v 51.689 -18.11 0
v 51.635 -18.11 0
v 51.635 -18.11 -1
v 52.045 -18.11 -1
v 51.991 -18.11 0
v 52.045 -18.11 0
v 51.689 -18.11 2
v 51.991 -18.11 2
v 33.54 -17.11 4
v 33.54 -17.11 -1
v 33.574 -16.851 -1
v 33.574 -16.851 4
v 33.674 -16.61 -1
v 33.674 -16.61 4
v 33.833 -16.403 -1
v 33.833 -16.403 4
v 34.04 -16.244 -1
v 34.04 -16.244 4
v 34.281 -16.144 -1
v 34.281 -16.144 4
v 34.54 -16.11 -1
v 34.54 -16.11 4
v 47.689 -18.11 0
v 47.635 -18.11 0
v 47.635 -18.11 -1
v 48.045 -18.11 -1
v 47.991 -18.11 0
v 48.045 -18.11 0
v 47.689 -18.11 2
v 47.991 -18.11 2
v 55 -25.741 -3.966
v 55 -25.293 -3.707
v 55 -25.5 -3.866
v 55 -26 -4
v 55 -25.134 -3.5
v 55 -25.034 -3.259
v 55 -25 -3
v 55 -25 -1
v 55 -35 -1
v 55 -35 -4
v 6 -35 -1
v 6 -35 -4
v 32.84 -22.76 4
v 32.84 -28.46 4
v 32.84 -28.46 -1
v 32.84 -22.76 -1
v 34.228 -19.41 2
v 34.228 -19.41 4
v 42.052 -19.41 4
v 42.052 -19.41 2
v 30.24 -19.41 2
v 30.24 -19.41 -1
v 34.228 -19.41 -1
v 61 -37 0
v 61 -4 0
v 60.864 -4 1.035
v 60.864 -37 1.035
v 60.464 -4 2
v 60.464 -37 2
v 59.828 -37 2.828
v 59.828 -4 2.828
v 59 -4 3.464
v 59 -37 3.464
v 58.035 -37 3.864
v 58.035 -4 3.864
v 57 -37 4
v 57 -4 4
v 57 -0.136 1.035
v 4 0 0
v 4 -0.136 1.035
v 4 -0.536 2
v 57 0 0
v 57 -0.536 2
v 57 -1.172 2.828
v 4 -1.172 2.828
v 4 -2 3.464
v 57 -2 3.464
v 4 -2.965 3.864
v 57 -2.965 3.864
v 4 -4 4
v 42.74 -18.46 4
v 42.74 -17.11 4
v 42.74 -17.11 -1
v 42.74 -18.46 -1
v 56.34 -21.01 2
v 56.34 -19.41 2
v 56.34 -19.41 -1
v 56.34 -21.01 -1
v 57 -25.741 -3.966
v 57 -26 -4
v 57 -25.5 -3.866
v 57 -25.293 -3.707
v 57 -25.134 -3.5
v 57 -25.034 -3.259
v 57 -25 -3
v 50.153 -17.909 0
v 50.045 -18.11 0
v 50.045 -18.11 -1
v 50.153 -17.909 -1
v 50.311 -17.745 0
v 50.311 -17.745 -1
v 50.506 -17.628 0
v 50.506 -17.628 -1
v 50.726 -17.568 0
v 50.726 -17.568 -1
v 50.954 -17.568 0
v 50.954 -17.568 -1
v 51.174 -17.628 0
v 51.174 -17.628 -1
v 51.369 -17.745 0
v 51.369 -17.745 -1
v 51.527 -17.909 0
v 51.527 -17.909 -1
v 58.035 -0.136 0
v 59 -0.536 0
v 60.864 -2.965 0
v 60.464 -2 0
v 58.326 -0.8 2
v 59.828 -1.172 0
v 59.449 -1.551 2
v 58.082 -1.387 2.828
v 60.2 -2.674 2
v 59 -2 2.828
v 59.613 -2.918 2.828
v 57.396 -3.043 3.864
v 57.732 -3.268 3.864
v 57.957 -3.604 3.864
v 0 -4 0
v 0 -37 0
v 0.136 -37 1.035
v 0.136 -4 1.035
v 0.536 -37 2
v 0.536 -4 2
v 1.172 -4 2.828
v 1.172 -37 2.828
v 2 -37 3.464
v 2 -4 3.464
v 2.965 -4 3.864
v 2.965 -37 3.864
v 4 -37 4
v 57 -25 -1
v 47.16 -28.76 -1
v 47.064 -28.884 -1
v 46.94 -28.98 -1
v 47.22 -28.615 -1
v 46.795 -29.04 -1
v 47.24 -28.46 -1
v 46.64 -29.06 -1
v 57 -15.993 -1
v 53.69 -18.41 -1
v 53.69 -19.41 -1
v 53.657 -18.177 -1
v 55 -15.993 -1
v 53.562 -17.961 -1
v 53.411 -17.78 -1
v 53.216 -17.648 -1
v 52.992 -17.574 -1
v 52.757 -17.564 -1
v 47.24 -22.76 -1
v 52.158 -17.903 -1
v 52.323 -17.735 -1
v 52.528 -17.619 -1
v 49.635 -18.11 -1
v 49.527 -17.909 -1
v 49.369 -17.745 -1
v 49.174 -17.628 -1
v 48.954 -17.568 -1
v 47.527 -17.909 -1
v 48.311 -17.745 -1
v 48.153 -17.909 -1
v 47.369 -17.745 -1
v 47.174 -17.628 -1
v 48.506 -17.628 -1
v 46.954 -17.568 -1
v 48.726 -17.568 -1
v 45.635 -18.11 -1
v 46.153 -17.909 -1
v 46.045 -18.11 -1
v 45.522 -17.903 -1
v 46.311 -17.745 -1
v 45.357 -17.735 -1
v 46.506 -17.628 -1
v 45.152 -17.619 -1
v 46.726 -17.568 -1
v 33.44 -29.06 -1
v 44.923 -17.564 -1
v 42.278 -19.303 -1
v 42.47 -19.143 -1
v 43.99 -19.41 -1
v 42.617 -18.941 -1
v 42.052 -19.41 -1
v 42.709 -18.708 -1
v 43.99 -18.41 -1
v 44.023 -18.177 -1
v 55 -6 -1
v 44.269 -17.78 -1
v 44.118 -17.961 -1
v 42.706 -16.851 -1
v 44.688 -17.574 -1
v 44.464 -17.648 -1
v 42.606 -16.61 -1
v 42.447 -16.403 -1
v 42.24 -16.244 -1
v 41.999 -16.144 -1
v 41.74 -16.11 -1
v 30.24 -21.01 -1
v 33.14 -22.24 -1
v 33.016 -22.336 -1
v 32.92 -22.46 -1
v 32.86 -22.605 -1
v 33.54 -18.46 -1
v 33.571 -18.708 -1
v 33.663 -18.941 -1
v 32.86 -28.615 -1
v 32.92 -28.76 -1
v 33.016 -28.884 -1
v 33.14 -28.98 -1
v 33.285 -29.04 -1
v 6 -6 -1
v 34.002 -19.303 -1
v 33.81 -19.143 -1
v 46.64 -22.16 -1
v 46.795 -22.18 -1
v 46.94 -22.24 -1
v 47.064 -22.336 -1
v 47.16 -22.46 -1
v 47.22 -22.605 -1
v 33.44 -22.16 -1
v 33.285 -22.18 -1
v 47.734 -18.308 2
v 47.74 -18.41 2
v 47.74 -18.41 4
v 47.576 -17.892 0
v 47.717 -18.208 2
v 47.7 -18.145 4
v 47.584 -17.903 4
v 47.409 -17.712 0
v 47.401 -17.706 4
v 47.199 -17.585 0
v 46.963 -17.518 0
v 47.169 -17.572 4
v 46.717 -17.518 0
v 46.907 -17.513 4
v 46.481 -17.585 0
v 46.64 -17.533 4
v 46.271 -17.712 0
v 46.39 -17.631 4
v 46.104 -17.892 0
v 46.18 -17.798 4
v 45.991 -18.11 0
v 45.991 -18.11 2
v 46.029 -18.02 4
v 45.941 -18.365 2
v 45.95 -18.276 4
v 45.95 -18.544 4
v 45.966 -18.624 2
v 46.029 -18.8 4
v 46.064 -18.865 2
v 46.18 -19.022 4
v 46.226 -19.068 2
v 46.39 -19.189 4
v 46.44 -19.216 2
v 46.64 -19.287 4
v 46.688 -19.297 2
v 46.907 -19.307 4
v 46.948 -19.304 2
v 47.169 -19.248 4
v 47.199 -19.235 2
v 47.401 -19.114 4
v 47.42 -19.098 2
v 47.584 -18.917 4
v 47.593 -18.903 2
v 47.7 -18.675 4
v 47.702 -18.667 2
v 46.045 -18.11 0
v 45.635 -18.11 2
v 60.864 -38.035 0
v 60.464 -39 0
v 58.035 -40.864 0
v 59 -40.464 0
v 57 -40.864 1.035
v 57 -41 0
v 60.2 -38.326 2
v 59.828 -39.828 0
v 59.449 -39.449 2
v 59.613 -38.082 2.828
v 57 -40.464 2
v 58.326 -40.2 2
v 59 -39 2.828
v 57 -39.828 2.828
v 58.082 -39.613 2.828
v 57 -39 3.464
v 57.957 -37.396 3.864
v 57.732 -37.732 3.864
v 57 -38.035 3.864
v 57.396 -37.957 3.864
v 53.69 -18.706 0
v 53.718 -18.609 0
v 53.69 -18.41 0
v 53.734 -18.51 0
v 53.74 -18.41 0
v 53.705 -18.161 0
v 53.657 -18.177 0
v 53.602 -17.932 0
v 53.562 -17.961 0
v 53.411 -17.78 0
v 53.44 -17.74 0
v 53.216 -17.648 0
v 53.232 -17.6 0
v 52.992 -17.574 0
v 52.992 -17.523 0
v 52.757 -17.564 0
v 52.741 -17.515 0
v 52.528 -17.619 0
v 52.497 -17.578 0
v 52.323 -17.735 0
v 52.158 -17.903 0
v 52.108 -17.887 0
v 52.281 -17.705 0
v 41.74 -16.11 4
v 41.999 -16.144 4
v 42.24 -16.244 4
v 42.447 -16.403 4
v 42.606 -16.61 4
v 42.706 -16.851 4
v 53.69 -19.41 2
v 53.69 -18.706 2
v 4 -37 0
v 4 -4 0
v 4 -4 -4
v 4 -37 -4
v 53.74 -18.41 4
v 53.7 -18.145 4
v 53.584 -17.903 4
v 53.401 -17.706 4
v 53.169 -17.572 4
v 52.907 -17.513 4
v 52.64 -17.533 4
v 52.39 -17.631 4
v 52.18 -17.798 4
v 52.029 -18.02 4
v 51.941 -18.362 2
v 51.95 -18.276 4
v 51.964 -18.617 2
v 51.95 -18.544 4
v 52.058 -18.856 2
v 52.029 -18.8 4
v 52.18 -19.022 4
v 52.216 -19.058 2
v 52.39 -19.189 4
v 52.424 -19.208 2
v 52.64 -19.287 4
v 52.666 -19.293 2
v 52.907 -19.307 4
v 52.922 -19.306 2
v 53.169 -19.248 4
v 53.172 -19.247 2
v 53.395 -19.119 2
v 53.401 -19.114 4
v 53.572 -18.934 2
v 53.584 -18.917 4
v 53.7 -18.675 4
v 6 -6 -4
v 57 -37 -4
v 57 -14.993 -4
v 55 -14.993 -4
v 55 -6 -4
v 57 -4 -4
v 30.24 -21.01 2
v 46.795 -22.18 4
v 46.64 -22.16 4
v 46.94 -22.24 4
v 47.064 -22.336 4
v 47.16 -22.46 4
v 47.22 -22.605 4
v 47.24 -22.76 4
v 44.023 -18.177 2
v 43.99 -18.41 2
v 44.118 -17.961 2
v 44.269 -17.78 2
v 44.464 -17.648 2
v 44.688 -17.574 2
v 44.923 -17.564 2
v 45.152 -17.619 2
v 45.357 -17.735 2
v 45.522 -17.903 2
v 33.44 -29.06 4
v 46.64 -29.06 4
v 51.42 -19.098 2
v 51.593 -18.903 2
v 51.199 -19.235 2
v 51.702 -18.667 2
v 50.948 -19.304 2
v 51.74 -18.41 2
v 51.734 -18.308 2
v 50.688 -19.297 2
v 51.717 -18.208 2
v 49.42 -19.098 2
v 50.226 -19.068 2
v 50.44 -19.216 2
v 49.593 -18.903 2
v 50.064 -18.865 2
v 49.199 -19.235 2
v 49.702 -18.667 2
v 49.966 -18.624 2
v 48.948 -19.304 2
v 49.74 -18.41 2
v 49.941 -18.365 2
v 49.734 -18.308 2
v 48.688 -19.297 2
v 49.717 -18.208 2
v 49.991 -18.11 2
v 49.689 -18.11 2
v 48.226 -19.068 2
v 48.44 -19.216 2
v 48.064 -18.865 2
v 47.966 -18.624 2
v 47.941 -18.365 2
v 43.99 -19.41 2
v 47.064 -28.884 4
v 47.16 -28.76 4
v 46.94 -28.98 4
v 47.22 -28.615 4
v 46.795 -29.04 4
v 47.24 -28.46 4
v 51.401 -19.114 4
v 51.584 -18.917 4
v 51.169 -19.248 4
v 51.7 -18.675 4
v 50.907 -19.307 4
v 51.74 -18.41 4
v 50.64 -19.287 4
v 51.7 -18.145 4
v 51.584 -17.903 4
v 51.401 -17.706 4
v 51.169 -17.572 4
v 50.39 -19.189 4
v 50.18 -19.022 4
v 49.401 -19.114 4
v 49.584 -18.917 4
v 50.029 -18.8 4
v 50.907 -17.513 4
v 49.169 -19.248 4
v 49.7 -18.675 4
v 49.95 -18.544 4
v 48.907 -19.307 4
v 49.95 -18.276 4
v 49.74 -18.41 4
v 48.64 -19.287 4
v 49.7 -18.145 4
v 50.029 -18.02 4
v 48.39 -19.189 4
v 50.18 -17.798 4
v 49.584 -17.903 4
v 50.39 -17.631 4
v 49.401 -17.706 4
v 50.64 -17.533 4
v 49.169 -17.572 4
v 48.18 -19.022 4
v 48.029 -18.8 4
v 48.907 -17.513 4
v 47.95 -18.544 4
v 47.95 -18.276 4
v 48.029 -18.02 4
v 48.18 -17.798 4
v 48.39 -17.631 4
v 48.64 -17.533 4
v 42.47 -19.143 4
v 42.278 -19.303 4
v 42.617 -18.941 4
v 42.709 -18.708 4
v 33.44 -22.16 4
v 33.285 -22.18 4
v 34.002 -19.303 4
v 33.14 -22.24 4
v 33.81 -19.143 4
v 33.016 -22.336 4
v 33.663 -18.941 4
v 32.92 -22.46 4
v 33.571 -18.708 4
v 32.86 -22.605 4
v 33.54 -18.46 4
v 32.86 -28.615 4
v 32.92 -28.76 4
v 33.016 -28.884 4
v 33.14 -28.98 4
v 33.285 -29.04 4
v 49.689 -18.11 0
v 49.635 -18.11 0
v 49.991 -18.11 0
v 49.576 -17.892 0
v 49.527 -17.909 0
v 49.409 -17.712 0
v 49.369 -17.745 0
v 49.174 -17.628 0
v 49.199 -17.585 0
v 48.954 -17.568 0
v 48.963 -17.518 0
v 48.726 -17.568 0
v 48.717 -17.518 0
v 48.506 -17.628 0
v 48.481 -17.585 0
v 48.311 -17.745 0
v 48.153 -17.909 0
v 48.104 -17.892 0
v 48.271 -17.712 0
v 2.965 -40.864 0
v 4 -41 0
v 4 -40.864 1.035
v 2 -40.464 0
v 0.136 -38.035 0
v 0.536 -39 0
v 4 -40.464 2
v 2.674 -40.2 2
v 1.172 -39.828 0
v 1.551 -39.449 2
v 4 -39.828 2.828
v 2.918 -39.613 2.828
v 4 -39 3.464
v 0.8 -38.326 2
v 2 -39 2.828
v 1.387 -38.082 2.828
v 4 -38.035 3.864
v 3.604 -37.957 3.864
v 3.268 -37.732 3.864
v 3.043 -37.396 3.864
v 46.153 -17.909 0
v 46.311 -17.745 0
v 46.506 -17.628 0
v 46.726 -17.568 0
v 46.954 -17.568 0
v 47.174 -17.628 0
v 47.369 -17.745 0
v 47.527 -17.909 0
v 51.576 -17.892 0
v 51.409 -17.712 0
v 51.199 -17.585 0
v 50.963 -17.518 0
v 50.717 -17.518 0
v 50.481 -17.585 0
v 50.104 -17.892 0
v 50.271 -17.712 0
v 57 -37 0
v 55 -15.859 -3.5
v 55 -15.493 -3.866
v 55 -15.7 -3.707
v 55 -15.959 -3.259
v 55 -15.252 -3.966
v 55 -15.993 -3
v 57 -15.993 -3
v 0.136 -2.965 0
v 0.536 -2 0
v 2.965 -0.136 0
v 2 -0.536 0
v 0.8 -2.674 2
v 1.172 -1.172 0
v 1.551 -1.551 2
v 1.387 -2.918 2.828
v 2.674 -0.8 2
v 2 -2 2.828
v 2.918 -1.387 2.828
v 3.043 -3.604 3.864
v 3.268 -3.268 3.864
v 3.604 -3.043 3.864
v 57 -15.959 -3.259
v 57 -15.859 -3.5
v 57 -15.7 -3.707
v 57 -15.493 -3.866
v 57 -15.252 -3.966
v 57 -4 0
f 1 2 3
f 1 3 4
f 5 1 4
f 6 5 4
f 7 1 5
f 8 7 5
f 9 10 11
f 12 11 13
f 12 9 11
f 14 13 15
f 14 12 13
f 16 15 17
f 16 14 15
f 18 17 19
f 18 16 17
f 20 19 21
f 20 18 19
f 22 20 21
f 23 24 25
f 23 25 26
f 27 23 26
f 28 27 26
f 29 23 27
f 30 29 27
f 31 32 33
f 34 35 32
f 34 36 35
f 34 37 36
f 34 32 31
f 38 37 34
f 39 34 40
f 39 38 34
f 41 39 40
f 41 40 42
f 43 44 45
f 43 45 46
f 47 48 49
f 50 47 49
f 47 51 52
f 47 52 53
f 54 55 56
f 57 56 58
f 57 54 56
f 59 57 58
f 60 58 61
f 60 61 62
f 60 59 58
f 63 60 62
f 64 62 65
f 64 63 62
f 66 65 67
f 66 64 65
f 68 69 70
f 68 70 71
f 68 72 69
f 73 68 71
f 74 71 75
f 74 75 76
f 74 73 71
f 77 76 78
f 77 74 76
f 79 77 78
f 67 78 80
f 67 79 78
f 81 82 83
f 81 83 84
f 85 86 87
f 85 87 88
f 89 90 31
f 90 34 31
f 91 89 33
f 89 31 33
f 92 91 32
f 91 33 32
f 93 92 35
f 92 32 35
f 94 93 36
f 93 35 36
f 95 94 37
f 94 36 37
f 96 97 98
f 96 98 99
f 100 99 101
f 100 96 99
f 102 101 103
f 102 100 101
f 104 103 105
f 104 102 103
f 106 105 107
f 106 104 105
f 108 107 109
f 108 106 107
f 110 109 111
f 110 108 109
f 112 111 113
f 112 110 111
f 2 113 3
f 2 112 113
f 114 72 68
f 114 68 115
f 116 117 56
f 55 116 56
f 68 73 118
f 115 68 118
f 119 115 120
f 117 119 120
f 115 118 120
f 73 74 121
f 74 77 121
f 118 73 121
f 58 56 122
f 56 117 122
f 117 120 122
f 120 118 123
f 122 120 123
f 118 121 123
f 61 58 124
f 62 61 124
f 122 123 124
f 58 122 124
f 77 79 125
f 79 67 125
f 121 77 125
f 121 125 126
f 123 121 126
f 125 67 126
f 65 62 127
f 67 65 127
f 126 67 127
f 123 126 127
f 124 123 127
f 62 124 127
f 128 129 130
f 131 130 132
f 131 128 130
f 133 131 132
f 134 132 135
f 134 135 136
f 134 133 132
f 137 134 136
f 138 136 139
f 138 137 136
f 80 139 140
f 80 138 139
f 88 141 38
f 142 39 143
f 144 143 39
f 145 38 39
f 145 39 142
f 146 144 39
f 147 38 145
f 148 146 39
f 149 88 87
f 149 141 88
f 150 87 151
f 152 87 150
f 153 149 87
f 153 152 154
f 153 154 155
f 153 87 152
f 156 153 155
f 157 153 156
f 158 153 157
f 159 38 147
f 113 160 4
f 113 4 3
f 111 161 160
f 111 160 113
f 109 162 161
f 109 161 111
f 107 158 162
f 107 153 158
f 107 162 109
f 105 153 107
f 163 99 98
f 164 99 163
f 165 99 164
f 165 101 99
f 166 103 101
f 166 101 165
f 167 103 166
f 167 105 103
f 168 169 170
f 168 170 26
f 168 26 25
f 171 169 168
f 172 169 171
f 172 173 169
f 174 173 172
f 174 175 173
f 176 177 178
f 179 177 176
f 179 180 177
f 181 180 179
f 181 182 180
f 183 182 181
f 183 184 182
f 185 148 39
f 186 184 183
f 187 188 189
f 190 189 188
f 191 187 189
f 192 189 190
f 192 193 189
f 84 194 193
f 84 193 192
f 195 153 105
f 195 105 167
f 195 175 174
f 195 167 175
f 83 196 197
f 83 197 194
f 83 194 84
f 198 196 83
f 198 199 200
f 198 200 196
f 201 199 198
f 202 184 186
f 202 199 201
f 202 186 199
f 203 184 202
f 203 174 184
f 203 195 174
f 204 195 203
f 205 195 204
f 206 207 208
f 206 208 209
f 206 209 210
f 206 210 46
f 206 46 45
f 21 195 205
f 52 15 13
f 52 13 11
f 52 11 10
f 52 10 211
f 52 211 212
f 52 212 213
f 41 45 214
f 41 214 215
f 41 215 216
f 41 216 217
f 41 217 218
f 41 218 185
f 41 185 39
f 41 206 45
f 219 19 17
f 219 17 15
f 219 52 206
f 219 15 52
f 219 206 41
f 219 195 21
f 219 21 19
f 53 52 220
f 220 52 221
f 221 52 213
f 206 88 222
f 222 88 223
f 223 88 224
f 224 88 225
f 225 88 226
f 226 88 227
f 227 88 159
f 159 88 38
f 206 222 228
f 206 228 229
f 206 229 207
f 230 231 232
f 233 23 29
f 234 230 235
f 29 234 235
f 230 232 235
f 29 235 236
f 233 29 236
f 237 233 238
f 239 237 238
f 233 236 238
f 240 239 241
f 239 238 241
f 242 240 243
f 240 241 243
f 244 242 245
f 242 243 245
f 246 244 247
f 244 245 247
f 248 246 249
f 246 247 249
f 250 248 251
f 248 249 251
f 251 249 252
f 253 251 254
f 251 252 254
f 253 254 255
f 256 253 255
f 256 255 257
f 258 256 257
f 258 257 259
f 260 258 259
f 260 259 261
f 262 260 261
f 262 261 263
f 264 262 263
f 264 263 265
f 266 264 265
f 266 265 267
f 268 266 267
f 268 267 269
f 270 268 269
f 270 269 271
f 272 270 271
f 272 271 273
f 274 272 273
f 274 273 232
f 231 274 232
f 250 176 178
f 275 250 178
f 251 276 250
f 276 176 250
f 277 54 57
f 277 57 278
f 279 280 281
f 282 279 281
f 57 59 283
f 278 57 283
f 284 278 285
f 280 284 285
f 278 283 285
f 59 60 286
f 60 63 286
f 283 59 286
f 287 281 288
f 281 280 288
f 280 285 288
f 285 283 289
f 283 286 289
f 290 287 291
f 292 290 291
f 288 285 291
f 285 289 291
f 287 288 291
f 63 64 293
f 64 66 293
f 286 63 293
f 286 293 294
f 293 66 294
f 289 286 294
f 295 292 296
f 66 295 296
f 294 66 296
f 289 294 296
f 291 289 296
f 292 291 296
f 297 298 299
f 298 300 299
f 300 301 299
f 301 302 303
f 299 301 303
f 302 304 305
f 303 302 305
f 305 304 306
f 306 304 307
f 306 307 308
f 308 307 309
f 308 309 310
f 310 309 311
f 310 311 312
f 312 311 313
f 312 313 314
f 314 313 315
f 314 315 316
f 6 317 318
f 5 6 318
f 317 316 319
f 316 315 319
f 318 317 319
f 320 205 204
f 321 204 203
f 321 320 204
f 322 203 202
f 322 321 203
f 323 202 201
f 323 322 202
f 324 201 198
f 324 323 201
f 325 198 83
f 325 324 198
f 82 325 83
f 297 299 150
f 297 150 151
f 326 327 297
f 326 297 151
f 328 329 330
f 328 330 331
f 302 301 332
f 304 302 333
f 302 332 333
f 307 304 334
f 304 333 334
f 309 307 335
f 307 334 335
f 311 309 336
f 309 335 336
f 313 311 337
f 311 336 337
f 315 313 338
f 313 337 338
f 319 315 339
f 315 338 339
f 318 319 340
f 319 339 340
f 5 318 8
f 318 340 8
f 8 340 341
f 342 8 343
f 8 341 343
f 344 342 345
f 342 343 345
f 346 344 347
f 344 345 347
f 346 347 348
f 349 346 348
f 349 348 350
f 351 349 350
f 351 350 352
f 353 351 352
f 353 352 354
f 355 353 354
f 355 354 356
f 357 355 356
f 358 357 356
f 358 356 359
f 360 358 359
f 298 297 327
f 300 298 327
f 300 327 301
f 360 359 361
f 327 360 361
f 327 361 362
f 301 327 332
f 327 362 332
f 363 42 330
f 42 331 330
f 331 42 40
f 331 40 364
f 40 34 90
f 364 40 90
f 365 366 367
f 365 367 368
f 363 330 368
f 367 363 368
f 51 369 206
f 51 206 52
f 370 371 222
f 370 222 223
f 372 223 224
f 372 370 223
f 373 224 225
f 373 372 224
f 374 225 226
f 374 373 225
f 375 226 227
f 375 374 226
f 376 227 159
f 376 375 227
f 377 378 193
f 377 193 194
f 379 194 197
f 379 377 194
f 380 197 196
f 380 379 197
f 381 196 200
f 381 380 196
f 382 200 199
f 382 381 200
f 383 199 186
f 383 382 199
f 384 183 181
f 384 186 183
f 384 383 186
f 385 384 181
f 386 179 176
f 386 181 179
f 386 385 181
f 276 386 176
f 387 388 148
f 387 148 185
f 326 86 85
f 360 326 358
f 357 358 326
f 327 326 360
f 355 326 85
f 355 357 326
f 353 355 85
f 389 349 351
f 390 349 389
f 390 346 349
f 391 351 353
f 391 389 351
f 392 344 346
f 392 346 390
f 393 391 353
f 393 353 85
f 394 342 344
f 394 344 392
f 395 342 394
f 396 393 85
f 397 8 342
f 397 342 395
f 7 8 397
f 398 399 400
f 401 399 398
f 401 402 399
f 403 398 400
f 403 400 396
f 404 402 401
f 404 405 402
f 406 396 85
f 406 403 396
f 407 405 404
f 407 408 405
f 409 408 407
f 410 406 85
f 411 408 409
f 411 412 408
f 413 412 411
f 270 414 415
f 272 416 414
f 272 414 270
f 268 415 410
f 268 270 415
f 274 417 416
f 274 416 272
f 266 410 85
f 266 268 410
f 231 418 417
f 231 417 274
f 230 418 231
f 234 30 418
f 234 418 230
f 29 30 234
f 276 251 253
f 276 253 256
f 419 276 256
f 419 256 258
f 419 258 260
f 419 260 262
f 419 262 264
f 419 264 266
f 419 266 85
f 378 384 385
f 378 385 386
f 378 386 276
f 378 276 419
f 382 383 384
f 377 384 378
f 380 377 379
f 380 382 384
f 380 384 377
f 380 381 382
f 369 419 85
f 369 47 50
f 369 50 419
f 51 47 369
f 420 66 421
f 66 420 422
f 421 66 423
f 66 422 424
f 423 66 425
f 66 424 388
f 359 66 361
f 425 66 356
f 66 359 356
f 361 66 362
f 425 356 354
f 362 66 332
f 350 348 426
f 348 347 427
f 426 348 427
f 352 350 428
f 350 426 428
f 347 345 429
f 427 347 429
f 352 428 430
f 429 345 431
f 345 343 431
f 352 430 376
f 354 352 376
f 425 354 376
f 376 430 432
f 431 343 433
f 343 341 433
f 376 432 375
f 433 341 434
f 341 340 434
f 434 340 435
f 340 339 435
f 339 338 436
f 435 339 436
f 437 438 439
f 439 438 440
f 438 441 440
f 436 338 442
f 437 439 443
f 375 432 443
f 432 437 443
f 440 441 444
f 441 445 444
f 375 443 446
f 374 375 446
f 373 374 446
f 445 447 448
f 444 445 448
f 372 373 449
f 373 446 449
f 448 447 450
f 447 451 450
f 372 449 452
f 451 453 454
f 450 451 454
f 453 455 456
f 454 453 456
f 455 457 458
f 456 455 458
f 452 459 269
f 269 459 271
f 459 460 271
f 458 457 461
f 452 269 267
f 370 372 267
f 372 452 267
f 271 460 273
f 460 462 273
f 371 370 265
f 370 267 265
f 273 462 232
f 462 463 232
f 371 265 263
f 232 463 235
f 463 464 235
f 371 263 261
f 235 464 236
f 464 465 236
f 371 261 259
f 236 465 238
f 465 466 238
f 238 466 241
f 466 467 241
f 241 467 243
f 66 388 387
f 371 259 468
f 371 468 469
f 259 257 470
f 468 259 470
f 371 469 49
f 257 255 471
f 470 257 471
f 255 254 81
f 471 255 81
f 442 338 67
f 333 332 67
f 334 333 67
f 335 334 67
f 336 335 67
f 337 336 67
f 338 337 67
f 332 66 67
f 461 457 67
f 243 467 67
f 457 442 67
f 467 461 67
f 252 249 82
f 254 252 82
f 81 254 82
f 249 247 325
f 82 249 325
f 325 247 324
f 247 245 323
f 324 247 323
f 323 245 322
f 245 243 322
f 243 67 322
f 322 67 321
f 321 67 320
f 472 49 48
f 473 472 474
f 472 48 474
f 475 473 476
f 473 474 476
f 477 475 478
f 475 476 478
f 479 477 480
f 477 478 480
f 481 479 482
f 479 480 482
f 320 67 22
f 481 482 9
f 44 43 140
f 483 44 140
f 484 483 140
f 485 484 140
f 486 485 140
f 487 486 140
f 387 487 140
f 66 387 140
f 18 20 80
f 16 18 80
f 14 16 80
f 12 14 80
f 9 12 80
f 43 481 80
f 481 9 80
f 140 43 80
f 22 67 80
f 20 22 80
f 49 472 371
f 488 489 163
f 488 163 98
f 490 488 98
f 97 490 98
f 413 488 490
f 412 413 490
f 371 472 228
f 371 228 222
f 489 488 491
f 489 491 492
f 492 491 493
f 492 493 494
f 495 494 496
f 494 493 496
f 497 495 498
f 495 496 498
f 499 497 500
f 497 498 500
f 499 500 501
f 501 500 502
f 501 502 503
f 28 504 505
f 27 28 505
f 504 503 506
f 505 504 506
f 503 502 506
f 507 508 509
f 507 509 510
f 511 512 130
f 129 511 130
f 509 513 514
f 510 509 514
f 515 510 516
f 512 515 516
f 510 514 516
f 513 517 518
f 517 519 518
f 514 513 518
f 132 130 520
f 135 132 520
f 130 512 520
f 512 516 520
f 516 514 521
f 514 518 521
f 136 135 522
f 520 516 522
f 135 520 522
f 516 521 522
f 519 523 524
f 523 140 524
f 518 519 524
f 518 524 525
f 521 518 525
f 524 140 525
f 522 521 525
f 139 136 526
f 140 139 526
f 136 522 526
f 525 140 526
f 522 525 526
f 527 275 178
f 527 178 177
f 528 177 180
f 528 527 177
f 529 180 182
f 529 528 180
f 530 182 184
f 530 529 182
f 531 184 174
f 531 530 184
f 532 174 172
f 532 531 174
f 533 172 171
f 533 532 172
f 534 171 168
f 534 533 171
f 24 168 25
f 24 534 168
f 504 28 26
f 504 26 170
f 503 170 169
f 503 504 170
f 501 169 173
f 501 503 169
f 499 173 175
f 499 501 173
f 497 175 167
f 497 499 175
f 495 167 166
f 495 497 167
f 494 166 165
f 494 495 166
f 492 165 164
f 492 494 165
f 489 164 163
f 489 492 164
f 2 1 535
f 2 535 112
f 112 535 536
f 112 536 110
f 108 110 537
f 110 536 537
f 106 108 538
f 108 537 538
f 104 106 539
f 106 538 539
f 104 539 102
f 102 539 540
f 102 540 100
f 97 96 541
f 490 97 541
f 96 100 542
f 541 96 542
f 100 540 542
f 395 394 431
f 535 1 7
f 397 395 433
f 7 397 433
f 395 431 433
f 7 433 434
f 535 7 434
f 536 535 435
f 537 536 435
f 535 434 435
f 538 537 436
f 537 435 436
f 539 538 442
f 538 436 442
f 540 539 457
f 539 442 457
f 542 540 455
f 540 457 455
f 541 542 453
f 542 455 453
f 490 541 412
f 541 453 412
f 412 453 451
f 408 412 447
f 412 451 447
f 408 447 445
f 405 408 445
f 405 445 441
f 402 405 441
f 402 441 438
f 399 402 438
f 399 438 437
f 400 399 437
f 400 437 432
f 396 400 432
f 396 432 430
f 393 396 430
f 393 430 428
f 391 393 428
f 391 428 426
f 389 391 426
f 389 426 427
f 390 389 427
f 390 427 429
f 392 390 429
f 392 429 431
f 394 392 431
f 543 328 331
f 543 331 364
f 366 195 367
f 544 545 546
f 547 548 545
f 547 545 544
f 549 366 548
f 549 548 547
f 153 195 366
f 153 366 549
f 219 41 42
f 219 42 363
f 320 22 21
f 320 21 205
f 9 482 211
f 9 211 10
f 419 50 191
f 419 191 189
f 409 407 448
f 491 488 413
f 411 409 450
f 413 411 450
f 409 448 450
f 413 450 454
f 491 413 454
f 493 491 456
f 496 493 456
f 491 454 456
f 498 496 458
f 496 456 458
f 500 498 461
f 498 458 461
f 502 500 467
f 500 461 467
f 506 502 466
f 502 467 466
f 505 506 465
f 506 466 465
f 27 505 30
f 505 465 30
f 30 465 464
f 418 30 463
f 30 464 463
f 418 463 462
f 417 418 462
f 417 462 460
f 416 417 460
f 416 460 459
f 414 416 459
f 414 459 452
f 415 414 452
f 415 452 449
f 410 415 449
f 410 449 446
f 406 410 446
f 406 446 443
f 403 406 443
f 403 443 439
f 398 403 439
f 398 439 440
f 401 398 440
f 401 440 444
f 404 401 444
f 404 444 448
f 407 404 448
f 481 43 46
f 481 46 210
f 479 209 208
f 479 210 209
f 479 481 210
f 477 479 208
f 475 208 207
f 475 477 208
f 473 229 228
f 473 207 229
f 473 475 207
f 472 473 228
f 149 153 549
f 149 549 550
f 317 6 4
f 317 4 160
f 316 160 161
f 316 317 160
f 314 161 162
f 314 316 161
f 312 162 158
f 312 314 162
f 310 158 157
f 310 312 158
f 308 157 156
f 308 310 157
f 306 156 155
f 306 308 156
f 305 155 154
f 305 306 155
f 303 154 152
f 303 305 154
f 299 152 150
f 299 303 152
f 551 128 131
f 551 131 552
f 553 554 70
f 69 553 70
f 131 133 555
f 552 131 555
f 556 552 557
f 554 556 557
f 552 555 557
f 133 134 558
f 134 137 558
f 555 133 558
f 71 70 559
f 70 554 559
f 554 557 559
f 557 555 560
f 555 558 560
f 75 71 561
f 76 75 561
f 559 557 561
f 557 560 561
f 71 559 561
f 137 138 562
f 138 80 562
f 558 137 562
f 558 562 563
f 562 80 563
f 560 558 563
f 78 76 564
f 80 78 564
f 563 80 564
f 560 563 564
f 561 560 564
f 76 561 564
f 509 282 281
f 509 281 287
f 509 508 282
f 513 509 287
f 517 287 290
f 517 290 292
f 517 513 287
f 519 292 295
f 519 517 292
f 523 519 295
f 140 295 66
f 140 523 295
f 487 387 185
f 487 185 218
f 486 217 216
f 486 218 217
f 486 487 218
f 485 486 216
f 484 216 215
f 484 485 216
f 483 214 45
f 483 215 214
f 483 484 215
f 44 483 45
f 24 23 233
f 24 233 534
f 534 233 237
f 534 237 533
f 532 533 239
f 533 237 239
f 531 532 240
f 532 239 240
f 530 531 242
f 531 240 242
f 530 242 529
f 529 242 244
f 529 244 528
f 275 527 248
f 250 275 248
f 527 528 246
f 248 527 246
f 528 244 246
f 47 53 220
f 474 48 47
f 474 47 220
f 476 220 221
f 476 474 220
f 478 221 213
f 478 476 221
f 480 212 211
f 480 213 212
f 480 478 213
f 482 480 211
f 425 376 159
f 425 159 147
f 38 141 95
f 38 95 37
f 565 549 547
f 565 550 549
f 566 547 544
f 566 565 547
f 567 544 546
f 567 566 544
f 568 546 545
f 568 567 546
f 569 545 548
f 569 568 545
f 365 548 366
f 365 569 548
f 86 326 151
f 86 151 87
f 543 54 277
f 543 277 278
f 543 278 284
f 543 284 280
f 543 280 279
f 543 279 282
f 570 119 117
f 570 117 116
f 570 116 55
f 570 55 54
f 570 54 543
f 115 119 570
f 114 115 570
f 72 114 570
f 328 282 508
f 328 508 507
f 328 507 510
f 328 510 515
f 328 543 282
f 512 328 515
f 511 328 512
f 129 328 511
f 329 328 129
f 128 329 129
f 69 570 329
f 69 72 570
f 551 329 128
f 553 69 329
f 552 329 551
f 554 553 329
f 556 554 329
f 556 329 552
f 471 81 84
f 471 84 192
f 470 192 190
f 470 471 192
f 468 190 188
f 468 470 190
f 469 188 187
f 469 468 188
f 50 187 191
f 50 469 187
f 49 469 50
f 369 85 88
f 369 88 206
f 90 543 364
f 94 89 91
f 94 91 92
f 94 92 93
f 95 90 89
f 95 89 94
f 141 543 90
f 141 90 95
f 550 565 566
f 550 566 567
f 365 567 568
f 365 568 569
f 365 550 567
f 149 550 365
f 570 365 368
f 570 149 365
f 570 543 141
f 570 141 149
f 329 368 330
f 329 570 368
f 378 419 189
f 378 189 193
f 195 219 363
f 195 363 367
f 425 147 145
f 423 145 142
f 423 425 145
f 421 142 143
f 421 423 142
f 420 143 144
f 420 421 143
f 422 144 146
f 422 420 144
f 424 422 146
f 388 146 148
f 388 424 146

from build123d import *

# Parameters (mm, degrees)
RESSALTO_EXTRUS_O1_DEPTH = 4
ESBO_O8_OUTSIDE_W        = 77.722
ESBO_O8_OUTSIDE_H        = 57.722
ESBO_O8_OUTSIDE_R        = 0.9
CORTE_EXTRUS_O8_DEPTH    = 5
FILETE4_R                = 4
ESBO_O11_W               = 53
ESBO_O11_H               = 33
RESSALTO_EXTRUS_O4_DEPTH = 1
CORTE_EXTRUS_O9_START    = -2
ESBO_O3_OUTSIDE_W        = 77.734
ESBO_O3_OUTSIDE_H        = 57.734
CORTE_EXTRUS_O9_DEPTH    = 8
RESSALTO_EXTRUS_O5_DEPTH = 3
FILETE5_R                = 1
FILETE6_R                = 1


with BuildPart() as part:
    # Esboço1 → Ressalto-extrusão1 (new body)
    with BuildSketch(Plane.XY):
        with BuildLine():
            Line((4, 0), (57, 0))
            ThreePointArc((57, 0), (59.828427125, -1.171572875), (61, -4))
            Line((61, -4), (61, -37))
            ThreePointArc((61, -37), (59.828427125, -39.828427125), (57, -41))
            Line((57, -41), (4, -41))
            ThreePointArc((4, -41), (1.171572875, -39.828427125), (0, -37))
            Line((0, -37), (0, -4))
            ThreePointArc((0, -4), (1.171572875, -1.171572875), (4, 0))
        make_face()
    extrude(amount=RESSALTO_EXTRUS_O1_DEPTH)

    # Esboço8 outside → Corte-extrusão8 (cut)
    # profile 1 of 7: a face of its own
    with BuildSketch(Plane.XY.offset(4)):
        with Locations((30.5, -20.5)):
            Rectangle(ESBO_O8_OUTSIDE_W, ESBO_O8_OUTSIDE_H)
        with BuildLine():
            Line((0, -4), (0, -37))
            ThreePointArc((0, -37), (1.171572875, -39.828427125), (4, -41))
            Line((4, -41), (57, -41))
            ThreePointArc((57, -41), (59.828427125, -39.828427125), (61, -37))
            Line((61, -37), (61, -4))
            ThreePointArc((61, -4), (59.828427125, -1.171572875), (57, 0))
            Line((57, 0), (4, 0))
            ThreePointArc((4, 0), (1.171572875, -1.171572875), (0, -4))
        make_face(mode=Mode.SUBTRACT)
    # profile 2 of 7: a face of its own
    with BuildSketch(Plane.XY.offset(4)):
        with Locations((46.84, -18.41)):
            Circle(ESBO_O8_OUTSIDE_R)
    # profile 3 of 7: a face of its own
    with BuildSketch(Plane.XY.offset(4)):
        with Locations((48.84, -18.41)):
            Circle(ESBO_O8_OUTSIDE_R)
    # profile 4 of 7: a face of its own
    with BuildSketch(Plane.XY.offset(4)):
        with Locations((50.84, -18.41)):
            Circle(ESBO_O8_OUTSIDE_R)
    # profile 5 of 7: a face of its own
    with BuildSketch(Plane.XY.offset(4)):
        with Locations((52.84, -18.41)):
            Circle(ESBO_O8_OUTSIDE_R)
    # profile 6 of 7: a face of its own
    with BuildSketch(Plane.XY.offset(4)):
        with BuildLine():
            Line((34.2277501, -19.41), (42.0522499, -19.41))
            ThreePointArc((42.0522499, -19.41), (42.550015401, -19.046408603), (42.74, -18.46))
            Line((42.74, -18.46), (42.74, -17.11))
            ThreePointArc((42.74, -17.11), (42.447106781, -16.402893219), (41.74, -16.11))
            Line((41.74, -16.11), (34.54, -16.11))
            ThreePointArc((34.54, -16.11), (33.832893219, -16.402893219), (33.54, -17.11))
            Line((33.54, -17.11), (33.54, -18.46))
            ThreePointArc((33.54, -18.46), (33.729984599, -19.046408603), (34.2277501, -19.41))
        make_face()
    # profile 7 of 7: a face of its own
    with BuildSketch(Plane.XY.offset(4)):
        with BuildLine():
            Line((32.84, -22.76), (32.84, -28.46))
            ThreePointArc((32.84, -28.46), (33.015735931, -28.884264069), (33.44, -29.06))
            Line((33.44, -29.06), (46.64, -29.06))
            ThreePointArc((46.64, -29.06), (47.064264069, -28.884264069), (47.24, -28.46))
            Line((47.24, -28.46), (47.24, -22.76))
            ThreePointArc((47.24, -22.76), (47.064264069, -22.335735931), (46.64, -22.16))
            Line((46.64, -22.16), (33.44, -22.16))
            ThreePointArc((33.44, -22.16), (33.015735931, -22.335735931), (32.84, -22.76))
        make_face()
    extrude(amount=-CORTE_EXTRUS_O8_DEPTH, mode=Mode.SUBTRACT)

    # Filete4
    filete4_edges = [part.edges().sort_by_distance(p)[0] for p in [
        (1.171572875, -1.171572875, 4),
        (0, -20.5, 4),
        (1.171572875, -39.828427125, 4),
        (30.5, -41, 4),
        (59.828427125, -39.828427125, 4),
        (61, -20.5, 4),
        (59.828427125, -1.171572875, 4),
        (30.5, 0, 4),
    ]]
    fillet(filete4_edges, radius=FILETE4_R - 0.0001)  # a hair under: the kernel refuses the full size

    # Esboço11 → Ressalto-extrusão4 (add)
    with BuildSketch(Plane(origin=(0, 0, 0), x_dir=(-1, 0, 0), z_dir=(0, 0, -1))):
        with Locations((-30.5, -20.5)):
            Rectangle(ESBO_O11_W, ESBO_O11_H)
    extrude(amount=RESSALTO_EXTRUS_O4_DEPTH)

    # Esboço3 outside → Corte-extrusão9 (cut)
    # profile 1 of 3: a face of its own
    with BuildSketch(Plane.XY.offset(4).offset(CORTE_EXTRUS_O9_START)):
        with Locations((30.5, -20.5)):
            Rectangle(ESBO_O3_OUTSIDE_W, ESBO_O3_OUTSIDE_H)
        with BuildLine():
            Line((0, -4), (0, -37))
            ThreePointArc((0, -37), (1.171572875, -39.828427125), (4, -41))
            Line((4, -41), (57, -41))
            ThreePointArc((57, -41), (59.828427125, -39.828427125), (61, -37))
            Line((61, -37), (61, -4))
            ThreePointArc((61, -4), (59.828427125, -1.171572875), (57, 0))
            Line((57, 0), (4, 0))
            ThreePointArc((4, 0), (1.171572875, -1.171572875), (0, -4))
        make_face(mode=Mode.SUBTRACT)
    # profile 2 of 3: a face of its own
    with BuildSketch(Plane.XY.offset(4).offset(CORTE_EXTRUS_O9_START)):
        with BuildLine():
            Line((53.69, -18.41), (53.69, -19.41))
            Line((53.69, -19.41), (56.34, -19.41))
            Line((56.34, -19.41), (56.34, -21.01))
            Line((56.34, -21.01), (30.24, -21.01))
            Line((30.24, -21.01), (30.24, -19.41))
            Line((30.24, -19.41), (34.2277501, -19.41))
            ThreePointArc((34.2277501, -19.41), (33.729984599, -19.046408603), (33.54, -18.46))
            Line((33.54, -18.46), (33.54, -17.11))
            ThreePointArc((33.54, -17.11), (33.832893219, -16.402893219), (34.54, -16.11))
            Line((34.54, -16.11), (41.74, -16.11))
            ThreePointArc((41.74, -16.11), (42.447106781, -16.402893219), (42.74, -17.11))
            Line((42.74, -17.11), (42.74, -18.46))
            ThreePointArc((42.74, -18.46), (42.550015401, -19.046408603), (42.0522499, -19.41))
            Line((42.0522499, -19.41), (43.99, -19.41))
            Line((43.99, -19.41), (43.99, -18.41))
            ThreePointArc((43.99, -18.41), (44.68752686, -17.573787143), (45.635298686, -18.11))
            Line((45.635298686, -18.11), (46.044701314, -18.11))
            ThreePointArc((46.044701314, -18.11), (46.84, -17.56), (47.635298686, -18.11))
            Line((47.635298686, -18.11), (48.044701314, -18.11))
            ThreePointArc((48.044701314, -18.11), (48.84, -17.56), (49.635298686, -18.11))
            Line((49.635298686, -18.11), (50.044701314, -18.11))
            ThreePointArc((50.044701314, -18.11), (50.84, -17.56), (51.635298686, -18.11))
            Line((51.635298686, -18.11), (52.044701314, -18.11))
            ThreePointArc((52.044701314, -18.11), (52.99247314, -17.573787143), (53.69, -18.41))
        make_face()
    # profile 3 of 3: a face of its own
    with BuildSketch(Plane.XY.offset(4).offset(CORTE_EXTRUS_O9_START)):
        with BuildLine():
            Line((33.44, -22.16), (46.64, -22.16))
            ThreePointArc((46.64, -22.16), (47.064264069, -22.335735931), (47.24, -22.76))
            Line((47.24, -22.76), (47.24, -28.46))
            ThreePointArc((47.24, -28.46), (47.064264069, -28.884264069), (46.64, -29.06))
            Line((46.64, -29.06), (33.44, -29.06))
            ThreePointArc((33.44, -29.06), (33.015735931, -28.884264069), (32.84, -28.46))
            Line((32.84, -28.46), (32.84, -22.76))
            ThreePointArc((32.84, -22.76), (33.015735931, -22.335735931), (33.44, -22.16))
        make_face()
    extrude(amount=-CORTE_EXTRUS_O9_DEPTH, mode=Mode.SUBTRACT)

    # Esboço13 → Ressalto-extrusão5 (add)
    with BuildSketch(Plane(origin=(0, 0, -1), x_dir=(-1, 0, 0), z_dir=(0, 0, -1))):
        Polygon((-57, -4), (-4, -4), (-4, -37), (-57, -37), (-57, -25), (-55, -25), (-55, -35), (-6, -35), (-6, -6), (-55, -6), (-55, -15.992966124), (-57, -15.992966124), align=None)
    extrude(amount=RESSALTO_EXTRUS_O5_DEPTH)

    # Filete5
    filete5_edges = [part.edges().sort_by_distance(p)[0] for p in [
        (56, -15.992966124, -4),
    ]]
    fillet(filete5_edges, radius=FILETE5_R)

    # Filete6
    filete6_edges = [part.edges().sort_by_distance(p)[0] for p in [
        (56, -25, -4),
    ]]
    fillet(filete6_edges, radius=FILETE6_R)


solid = part.part
